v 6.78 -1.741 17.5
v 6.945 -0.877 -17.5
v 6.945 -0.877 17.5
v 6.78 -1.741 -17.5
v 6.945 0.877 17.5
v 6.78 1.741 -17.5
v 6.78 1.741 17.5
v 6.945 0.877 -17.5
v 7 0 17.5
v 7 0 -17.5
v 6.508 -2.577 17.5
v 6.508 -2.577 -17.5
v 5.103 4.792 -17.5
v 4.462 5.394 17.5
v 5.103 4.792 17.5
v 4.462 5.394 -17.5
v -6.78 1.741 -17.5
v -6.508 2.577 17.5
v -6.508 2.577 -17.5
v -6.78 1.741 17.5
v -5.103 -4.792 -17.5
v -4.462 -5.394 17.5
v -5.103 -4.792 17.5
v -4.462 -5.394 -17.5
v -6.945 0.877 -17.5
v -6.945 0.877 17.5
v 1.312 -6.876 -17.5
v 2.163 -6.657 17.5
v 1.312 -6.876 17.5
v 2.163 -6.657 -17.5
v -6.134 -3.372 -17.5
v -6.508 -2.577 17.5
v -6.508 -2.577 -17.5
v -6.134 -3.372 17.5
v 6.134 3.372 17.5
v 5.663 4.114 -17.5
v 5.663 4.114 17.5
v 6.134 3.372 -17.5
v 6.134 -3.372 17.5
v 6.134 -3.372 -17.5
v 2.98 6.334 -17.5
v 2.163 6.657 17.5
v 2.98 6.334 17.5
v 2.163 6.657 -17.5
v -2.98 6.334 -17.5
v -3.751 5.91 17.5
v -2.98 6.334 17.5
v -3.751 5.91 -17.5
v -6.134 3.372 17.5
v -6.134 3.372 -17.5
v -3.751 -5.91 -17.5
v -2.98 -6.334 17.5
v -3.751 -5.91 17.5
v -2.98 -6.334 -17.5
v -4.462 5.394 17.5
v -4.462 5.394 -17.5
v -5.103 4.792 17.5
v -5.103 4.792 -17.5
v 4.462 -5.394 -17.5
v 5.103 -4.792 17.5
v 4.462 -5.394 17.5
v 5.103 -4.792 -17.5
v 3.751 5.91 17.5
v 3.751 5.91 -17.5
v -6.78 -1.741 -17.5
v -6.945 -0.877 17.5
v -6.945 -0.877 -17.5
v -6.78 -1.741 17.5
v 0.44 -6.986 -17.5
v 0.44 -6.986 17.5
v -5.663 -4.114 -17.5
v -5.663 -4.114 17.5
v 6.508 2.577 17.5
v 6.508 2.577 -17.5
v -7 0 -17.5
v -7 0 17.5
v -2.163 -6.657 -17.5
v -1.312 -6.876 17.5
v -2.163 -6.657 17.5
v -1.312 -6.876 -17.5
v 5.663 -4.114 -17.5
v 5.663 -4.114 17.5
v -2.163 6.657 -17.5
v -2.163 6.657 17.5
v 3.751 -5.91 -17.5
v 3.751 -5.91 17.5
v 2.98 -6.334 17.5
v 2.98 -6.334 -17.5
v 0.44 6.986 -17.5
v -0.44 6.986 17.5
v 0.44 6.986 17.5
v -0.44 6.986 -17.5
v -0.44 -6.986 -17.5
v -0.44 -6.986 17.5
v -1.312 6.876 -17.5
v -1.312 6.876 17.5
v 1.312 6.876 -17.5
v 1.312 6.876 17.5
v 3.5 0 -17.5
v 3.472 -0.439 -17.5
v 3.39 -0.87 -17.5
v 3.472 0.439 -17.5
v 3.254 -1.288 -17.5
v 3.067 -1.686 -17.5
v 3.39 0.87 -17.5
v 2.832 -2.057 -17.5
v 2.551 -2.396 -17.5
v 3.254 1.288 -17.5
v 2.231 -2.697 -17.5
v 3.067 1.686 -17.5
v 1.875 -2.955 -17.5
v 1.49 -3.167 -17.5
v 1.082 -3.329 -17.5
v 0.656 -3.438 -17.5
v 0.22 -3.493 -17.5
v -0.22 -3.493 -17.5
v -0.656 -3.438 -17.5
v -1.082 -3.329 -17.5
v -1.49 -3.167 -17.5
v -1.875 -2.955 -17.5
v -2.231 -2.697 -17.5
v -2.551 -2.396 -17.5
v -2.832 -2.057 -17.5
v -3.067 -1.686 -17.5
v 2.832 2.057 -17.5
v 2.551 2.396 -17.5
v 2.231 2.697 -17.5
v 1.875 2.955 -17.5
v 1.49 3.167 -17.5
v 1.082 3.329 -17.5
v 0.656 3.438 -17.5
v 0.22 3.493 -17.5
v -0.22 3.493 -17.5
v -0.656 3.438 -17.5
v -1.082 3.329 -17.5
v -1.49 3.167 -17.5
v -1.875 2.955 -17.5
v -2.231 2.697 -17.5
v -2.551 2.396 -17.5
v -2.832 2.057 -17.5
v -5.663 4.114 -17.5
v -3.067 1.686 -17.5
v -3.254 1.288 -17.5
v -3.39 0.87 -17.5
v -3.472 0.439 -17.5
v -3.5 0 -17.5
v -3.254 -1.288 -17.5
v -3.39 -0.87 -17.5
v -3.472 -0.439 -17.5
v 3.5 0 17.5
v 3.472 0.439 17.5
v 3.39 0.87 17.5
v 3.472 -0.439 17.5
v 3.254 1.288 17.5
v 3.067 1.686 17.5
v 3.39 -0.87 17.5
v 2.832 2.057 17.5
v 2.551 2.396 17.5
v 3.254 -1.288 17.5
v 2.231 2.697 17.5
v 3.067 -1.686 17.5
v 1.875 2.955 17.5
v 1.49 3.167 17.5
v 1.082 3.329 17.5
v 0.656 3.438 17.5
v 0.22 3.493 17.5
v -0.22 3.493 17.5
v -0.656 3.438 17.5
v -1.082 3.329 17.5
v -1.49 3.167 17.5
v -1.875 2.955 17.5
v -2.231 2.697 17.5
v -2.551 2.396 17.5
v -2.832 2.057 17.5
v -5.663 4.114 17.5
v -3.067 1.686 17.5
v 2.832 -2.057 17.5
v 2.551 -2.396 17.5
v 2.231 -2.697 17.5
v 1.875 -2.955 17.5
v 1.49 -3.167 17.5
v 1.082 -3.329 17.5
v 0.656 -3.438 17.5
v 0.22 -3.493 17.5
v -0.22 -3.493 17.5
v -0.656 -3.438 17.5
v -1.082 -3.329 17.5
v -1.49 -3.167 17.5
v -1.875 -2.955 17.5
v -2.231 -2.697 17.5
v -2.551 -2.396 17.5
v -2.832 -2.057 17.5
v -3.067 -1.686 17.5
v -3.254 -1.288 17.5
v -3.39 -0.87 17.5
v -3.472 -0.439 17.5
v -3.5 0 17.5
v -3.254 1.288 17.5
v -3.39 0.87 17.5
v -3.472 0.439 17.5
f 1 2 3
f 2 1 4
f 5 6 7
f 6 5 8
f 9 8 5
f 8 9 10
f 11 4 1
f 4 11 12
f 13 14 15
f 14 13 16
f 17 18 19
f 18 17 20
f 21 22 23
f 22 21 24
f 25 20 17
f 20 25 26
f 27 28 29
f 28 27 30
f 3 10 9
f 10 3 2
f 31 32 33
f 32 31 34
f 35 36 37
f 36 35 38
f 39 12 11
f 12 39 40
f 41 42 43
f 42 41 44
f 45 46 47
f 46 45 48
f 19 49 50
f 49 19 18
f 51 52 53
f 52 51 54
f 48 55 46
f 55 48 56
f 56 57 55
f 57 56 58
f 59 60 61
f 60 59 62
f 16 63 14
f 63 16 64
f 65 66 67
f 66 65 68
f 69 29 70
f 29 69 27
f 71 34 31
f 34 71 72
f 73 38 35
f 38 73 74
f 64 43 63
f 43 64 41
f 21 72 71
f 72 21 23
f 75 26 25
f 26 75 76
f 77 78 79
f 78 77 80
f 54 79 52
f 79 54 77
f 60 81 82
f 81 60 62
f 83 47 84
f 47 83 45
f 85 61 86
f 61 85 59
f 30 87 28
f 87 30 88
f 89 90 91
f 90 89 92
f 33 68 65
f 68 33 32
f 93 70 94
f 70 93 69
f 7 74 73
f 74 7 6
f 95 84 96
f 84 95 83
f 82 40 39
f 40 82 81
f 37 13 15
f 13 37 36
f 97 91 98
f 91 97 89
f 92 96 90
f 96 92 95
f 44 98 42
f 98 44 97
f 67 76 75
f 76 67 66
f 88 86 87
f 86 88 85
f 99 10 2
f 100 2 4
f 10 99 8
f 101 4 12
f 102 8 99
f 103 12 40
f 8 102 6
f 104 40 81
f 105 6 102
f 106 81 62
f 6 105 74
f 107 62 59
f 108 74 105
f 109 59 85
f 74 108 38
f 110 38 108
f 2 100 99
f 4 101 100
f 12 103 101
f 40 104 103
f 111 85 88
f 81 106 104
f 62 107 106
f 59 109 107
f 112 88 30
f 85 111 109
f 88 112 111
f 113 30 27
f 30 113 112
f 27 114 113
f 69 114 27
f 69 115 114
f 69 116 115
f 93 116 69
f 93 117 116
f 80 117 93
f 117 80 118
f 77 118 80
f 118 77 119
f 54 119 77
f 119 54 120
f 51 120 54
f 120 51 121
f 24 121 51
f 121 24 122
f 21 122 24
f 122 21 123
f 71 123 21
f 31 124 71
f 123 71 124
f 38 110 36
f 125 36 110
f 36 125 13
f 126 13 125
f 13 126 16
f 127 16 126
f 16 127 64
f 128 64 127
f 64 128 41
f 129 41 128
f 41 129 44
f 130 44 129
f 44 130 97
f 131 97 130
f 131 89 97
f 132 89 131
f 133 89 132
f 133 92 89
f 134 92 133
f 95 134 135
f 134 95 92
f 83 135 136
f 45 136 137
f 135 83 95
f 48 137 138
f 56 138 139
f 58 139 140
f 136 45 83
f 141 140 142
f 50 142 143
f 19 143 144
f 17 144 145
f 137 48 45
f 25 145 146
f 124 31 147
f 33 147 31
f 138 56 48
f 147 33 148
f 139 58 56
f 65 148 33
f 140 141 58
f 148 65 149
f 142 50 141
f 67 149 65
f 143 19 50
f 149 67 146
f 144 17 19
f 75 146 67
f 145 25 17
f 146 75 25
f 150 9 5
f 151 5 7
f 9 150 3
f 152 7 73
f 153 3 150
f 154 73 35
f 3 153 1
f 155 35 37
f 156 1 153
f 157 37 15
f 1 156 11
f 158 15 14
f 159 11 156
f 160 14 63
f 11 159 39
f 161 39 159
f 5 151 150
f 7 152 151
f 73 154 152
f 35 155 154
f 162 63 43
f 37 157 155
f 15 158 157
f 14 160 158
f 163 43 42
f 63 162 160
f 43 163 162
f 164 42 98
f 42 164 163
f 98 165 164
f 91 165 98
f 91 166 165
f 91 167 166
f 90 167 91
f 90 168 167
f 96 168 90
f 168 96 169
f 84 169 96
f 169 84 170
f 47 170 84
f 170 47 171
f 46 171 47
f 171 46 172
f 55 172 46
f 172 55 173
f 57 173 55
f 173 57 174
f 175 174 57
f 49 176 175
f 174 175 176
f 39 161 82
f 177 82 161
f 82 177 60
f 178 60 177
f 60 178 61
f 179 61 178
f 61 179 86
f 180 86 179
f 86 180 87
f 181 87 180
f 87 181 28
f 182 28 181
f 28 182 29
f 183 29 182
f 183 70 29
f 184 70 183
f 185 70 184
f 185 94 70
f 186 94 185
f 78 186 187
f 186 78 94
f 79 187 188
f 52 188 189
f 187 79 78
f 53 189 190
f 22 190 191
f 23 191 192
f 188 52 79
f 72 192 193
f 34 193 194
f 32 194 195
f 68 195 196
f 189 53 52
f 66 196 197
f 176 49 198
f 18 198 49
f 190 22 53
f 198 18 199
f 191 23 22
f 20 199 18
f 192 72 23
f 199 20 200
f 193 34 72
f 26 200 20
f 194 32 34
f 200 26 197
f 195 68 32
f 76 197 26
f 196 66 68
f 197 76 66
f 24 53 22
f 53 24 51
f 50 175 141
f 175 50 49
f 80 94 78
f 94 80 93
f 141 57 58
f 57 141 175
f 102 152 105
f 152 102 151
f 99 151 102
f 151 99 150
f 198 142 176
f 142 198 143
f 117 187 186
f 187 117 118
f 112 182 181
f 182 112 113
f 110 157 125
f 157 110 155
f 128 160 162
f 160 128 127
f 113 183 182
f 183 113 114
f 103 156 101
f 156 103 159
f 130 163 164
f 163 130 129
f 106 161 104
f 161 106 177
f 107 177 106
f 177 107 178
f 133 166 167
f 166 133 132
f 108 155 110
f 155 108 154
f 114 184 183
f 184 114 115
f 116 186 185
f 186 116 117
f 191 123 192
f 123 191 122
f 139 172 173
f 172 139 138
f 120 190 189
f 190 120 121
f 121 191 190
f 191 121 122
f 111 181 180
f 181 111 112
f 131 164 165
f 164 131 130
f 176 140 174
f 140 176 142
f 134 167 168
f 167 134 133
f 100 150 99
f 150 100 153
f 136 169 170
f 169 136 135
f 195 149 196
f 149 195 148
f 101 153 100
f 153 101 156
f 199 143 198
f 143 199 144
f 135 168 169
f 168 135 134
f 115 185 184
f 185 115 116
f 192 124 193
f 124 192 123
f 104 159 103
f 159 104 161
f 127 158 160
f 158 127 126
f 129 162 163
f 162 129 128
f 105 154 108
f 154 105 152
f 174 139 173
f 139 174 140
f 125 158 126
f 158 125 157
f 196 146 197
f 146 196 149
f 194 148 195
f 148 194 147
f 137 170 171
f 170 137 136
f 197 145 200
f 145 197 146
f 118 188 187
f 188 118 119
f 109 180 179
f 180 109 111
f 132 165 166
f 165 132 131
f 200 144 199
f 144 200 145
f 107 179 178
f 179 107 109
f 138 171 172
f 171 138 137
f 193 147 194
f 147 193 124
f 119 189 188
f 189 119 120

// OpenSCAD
$fn = 50;


difference() {
	union() {
		translate(v = [0, 0, -17.5000000000]) {
			cylinder(h = 35, r = 7.0000000000);
		}
	}
	union() {
		translate(v = [0, 0, -100.0000000000]) {
			cylinder(h = 200, r = 3.5000000000);
		}
	}
}
